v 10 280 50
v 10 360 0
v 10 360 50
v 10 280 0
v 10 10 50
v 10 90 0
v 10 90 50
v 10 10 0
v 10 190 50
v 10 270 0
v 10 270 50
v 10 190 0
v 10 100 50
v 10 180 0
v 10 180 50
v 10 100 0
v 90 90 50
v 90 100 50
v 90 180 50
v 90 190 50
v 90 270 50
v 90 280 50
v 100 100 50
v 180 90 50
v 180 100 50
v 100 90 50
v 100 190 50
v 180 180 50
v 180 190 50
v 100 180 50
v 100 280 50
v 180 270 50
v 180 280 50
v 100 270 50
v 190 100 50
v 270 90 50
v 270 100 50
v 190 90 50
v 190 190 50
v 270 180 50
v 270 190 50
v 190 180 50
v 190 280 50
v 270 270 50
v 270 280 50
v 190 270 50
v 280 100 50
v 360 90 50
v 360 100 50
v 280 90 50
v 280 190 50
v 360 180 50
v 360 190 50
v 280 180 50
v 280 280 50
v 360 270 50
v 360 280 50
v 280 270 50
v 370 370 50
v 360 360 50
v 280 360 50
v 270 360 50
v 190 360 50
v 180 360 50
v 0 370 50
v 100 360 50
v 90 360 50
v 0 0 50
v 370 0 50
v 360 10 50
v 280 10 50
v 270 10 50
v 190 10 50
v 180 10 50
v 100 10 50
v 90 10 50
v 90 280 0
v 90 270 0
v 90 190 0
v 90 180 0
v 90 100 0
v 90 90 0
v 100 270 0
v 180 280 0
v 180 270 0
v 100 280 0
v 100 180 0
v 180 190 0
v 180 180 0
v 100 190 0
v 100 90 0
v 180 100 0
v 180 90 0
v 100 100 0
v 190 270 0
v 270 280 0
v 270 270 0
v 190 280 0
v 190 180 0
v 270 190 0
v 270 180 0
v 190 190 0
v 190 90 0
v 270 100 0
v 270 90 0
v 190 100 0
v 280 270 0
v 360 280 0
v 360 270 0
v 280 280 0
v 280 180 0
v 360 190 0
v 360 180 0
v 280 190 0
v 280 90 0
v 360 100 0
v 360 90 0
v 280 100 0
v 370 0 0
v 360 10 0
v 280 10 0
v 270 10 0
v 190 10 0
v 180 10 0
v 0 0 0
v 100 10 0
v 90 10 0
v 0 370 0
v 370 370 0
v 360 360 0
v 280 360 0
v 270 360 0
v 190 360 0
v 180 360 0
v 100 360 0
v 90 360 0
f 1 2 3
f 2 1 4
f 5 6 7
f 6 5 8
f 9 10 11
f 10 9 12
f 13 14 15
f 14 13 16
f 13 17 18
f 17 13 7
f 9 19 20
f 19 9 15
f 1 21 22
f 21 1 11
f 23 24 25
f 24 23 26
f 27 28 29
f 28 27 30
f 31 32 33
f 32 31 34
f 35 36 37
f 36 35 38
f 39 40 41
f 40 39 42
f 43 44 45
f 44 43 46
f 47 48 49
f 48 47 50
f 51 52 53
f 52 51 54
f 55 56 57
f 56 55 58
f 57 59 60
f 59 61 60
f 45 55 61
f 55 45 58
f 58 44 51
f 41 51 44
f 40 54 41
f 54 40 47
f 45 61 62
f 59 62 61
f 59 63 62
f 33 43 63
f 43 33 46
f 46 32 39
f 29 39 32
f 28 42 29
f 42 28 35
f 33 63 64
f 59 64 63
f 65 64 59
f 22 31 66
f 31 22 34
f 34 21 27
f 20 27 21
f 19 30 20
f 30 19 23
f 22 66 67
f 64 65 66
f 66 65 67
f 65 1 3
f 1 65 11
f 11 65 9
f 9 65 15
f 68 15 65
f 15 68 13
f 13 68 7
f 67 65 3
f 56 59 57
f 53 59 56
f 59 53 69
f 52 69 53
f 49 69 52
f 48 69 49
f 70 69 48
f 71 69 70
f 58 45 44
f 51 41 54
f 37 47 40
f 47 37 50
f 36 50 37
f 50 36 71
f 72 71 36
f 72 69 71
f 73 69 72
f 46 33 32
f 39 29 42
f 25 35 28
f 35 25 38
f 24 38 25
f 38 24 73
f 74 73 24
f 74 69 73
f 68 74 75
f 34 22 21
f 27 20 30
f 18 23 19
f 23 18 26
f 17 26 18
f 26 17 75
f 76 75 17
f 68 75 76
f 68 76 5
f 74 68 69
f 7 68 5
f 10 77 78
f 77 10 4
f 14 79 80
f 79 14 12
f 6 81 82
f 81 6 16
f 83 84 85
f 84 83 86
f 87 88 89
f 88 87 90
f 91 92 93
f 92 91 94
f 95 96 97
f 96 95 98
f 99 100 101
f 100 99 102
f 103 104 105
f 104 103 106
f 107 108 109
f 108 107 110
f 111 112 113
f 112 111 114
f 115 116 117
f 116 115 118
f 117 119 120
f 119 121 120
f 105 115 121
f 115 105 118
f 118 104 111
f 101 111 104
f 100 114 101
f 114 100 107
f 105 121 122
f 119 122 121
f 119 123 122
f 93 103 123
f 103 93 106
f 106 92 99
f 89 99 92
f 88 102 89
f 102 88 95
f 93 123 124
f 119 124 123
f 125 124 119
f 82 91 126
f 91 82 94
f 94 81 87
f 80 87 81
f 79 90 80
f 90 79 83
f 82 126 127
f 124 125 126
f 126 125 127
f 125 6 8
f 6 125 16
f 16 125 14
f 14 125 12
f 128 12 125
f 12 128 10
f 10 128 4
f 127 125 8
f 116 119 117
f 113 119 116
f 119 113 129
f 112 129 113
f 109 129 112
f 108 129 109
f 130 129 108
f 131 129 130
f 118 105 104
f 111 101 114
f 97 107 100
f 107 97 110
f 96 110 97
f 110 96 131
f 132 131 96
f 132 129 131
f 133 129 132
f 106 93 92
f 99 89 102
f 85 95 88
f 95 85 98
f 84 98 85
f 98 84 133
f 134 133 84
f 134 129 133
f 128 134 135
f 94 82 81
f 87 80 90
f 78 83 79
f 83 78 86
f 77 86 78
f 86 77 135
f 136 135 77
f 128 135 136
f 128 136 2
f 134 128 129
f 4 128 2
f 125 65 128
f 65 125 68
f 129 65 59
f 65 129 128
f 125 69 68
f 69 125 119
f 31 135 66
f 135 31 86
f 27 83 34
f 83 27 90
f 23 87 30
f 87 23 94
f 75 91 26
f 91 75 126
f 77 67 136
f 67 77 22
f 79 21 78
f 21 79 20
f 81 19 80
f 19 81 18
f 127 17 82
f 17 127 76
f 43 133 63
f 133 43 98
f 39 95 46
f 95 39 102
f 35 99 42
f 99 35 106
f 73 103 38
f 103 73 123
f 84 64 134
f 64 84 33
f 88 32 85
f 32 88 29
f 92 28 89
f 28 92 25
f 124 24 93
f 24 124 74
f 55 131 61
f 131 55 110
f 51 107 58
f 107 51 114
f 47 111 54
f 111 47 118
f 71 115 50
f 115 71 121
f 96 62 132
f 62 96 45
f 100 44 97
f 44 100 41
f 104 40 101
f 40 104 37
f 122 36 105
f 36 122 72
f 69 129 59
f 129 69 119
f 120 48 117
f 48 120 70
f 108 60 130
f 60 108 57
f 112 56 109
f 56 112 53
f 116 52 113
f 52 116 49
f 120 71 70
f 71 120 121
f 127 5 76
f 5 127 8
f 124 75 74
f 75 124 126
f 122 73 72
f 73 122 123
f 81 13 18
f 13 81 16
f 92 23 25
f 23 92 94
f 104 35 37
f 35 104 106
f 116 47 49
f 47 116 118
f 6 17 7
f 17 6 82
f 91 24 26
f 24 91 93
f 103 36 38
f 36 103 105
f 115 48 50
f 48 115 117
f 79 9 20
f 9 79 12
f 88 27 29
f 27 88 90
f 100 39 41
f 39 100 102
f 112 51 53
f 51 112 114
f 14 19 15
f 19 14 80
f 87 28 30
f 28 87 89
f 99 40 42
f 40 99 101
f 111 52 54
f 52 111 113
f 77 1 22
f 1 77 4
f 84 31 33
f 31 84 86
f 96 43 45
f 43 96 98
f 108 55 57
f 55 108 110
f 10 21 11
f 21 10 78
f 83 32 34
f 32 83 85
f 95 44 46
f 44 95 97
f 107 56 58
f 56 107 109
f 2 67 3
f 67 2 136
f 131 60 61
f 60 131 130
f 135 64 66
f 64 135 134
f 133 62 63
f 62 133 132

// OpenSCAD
// OpenSCAD: One 50 mm-thick slice (370 x 370 x 50) of a 3D printed cage grid
// Grid: 5 bars along X (width 370, cross-section 10x10), 5 bars along Y (length 370), plus 4 corner vertical bars (Z-direction) with M6 clearance holes
// Parameters
t = 10;           // bar thickness (mm), square cross-section 10x10
g = 80;            // gap between adjacent bars (mm)
size = 370;         // outer footprint (X and Y) in mm
height_slice = 50;  // slice thickness along Z (mm)
hole_d = 6.5;     // through-hole diameter for M6 clearance (mm)
hole_r = hole_d/2;

module corner_bar_with_hole(cx, cy){
    // Corner bar: 10x10x50 with through-hole centered in the bar
    difference(){
        translate([cx, cy, 0]) cube([t, t, height_slice]);
        translate([cx + t/2, cy + t/2, 0]) cylinder(h=height_slice, r=hole_r, center=false);
    }
}

module grid_slice(){
    // Bars along Y (vertical strands in X direction)
    for(i=[0,1,2,3,4]){
        x = i*(t + g);
        translate([x, 0, 0]) cube([t, size, height_slice]);
    }
    // Bars along X (horizontal strands in Y direction)
    for(j=[0,1,2,3,4]){
        y = j*(t + g);
        translate([0, y, 0]) cube([size, t, height_slice]);
    }
    // Corner vertical bars with through-holes (Z-direction)
    corner_bar_with_hole(0, 0);           // bottom-left
    corner_bar_with_hole(size - t, 0);    // bottom-right (x=360)
    corner_bar_with_hole(0, size - t);    // top-left (y=360)
    corner_bar_with_hole(size - t, size - t); // top-right (x=360, y=360)
}

// Render one slice at its local origin (0,0,0)
grid_slice();
